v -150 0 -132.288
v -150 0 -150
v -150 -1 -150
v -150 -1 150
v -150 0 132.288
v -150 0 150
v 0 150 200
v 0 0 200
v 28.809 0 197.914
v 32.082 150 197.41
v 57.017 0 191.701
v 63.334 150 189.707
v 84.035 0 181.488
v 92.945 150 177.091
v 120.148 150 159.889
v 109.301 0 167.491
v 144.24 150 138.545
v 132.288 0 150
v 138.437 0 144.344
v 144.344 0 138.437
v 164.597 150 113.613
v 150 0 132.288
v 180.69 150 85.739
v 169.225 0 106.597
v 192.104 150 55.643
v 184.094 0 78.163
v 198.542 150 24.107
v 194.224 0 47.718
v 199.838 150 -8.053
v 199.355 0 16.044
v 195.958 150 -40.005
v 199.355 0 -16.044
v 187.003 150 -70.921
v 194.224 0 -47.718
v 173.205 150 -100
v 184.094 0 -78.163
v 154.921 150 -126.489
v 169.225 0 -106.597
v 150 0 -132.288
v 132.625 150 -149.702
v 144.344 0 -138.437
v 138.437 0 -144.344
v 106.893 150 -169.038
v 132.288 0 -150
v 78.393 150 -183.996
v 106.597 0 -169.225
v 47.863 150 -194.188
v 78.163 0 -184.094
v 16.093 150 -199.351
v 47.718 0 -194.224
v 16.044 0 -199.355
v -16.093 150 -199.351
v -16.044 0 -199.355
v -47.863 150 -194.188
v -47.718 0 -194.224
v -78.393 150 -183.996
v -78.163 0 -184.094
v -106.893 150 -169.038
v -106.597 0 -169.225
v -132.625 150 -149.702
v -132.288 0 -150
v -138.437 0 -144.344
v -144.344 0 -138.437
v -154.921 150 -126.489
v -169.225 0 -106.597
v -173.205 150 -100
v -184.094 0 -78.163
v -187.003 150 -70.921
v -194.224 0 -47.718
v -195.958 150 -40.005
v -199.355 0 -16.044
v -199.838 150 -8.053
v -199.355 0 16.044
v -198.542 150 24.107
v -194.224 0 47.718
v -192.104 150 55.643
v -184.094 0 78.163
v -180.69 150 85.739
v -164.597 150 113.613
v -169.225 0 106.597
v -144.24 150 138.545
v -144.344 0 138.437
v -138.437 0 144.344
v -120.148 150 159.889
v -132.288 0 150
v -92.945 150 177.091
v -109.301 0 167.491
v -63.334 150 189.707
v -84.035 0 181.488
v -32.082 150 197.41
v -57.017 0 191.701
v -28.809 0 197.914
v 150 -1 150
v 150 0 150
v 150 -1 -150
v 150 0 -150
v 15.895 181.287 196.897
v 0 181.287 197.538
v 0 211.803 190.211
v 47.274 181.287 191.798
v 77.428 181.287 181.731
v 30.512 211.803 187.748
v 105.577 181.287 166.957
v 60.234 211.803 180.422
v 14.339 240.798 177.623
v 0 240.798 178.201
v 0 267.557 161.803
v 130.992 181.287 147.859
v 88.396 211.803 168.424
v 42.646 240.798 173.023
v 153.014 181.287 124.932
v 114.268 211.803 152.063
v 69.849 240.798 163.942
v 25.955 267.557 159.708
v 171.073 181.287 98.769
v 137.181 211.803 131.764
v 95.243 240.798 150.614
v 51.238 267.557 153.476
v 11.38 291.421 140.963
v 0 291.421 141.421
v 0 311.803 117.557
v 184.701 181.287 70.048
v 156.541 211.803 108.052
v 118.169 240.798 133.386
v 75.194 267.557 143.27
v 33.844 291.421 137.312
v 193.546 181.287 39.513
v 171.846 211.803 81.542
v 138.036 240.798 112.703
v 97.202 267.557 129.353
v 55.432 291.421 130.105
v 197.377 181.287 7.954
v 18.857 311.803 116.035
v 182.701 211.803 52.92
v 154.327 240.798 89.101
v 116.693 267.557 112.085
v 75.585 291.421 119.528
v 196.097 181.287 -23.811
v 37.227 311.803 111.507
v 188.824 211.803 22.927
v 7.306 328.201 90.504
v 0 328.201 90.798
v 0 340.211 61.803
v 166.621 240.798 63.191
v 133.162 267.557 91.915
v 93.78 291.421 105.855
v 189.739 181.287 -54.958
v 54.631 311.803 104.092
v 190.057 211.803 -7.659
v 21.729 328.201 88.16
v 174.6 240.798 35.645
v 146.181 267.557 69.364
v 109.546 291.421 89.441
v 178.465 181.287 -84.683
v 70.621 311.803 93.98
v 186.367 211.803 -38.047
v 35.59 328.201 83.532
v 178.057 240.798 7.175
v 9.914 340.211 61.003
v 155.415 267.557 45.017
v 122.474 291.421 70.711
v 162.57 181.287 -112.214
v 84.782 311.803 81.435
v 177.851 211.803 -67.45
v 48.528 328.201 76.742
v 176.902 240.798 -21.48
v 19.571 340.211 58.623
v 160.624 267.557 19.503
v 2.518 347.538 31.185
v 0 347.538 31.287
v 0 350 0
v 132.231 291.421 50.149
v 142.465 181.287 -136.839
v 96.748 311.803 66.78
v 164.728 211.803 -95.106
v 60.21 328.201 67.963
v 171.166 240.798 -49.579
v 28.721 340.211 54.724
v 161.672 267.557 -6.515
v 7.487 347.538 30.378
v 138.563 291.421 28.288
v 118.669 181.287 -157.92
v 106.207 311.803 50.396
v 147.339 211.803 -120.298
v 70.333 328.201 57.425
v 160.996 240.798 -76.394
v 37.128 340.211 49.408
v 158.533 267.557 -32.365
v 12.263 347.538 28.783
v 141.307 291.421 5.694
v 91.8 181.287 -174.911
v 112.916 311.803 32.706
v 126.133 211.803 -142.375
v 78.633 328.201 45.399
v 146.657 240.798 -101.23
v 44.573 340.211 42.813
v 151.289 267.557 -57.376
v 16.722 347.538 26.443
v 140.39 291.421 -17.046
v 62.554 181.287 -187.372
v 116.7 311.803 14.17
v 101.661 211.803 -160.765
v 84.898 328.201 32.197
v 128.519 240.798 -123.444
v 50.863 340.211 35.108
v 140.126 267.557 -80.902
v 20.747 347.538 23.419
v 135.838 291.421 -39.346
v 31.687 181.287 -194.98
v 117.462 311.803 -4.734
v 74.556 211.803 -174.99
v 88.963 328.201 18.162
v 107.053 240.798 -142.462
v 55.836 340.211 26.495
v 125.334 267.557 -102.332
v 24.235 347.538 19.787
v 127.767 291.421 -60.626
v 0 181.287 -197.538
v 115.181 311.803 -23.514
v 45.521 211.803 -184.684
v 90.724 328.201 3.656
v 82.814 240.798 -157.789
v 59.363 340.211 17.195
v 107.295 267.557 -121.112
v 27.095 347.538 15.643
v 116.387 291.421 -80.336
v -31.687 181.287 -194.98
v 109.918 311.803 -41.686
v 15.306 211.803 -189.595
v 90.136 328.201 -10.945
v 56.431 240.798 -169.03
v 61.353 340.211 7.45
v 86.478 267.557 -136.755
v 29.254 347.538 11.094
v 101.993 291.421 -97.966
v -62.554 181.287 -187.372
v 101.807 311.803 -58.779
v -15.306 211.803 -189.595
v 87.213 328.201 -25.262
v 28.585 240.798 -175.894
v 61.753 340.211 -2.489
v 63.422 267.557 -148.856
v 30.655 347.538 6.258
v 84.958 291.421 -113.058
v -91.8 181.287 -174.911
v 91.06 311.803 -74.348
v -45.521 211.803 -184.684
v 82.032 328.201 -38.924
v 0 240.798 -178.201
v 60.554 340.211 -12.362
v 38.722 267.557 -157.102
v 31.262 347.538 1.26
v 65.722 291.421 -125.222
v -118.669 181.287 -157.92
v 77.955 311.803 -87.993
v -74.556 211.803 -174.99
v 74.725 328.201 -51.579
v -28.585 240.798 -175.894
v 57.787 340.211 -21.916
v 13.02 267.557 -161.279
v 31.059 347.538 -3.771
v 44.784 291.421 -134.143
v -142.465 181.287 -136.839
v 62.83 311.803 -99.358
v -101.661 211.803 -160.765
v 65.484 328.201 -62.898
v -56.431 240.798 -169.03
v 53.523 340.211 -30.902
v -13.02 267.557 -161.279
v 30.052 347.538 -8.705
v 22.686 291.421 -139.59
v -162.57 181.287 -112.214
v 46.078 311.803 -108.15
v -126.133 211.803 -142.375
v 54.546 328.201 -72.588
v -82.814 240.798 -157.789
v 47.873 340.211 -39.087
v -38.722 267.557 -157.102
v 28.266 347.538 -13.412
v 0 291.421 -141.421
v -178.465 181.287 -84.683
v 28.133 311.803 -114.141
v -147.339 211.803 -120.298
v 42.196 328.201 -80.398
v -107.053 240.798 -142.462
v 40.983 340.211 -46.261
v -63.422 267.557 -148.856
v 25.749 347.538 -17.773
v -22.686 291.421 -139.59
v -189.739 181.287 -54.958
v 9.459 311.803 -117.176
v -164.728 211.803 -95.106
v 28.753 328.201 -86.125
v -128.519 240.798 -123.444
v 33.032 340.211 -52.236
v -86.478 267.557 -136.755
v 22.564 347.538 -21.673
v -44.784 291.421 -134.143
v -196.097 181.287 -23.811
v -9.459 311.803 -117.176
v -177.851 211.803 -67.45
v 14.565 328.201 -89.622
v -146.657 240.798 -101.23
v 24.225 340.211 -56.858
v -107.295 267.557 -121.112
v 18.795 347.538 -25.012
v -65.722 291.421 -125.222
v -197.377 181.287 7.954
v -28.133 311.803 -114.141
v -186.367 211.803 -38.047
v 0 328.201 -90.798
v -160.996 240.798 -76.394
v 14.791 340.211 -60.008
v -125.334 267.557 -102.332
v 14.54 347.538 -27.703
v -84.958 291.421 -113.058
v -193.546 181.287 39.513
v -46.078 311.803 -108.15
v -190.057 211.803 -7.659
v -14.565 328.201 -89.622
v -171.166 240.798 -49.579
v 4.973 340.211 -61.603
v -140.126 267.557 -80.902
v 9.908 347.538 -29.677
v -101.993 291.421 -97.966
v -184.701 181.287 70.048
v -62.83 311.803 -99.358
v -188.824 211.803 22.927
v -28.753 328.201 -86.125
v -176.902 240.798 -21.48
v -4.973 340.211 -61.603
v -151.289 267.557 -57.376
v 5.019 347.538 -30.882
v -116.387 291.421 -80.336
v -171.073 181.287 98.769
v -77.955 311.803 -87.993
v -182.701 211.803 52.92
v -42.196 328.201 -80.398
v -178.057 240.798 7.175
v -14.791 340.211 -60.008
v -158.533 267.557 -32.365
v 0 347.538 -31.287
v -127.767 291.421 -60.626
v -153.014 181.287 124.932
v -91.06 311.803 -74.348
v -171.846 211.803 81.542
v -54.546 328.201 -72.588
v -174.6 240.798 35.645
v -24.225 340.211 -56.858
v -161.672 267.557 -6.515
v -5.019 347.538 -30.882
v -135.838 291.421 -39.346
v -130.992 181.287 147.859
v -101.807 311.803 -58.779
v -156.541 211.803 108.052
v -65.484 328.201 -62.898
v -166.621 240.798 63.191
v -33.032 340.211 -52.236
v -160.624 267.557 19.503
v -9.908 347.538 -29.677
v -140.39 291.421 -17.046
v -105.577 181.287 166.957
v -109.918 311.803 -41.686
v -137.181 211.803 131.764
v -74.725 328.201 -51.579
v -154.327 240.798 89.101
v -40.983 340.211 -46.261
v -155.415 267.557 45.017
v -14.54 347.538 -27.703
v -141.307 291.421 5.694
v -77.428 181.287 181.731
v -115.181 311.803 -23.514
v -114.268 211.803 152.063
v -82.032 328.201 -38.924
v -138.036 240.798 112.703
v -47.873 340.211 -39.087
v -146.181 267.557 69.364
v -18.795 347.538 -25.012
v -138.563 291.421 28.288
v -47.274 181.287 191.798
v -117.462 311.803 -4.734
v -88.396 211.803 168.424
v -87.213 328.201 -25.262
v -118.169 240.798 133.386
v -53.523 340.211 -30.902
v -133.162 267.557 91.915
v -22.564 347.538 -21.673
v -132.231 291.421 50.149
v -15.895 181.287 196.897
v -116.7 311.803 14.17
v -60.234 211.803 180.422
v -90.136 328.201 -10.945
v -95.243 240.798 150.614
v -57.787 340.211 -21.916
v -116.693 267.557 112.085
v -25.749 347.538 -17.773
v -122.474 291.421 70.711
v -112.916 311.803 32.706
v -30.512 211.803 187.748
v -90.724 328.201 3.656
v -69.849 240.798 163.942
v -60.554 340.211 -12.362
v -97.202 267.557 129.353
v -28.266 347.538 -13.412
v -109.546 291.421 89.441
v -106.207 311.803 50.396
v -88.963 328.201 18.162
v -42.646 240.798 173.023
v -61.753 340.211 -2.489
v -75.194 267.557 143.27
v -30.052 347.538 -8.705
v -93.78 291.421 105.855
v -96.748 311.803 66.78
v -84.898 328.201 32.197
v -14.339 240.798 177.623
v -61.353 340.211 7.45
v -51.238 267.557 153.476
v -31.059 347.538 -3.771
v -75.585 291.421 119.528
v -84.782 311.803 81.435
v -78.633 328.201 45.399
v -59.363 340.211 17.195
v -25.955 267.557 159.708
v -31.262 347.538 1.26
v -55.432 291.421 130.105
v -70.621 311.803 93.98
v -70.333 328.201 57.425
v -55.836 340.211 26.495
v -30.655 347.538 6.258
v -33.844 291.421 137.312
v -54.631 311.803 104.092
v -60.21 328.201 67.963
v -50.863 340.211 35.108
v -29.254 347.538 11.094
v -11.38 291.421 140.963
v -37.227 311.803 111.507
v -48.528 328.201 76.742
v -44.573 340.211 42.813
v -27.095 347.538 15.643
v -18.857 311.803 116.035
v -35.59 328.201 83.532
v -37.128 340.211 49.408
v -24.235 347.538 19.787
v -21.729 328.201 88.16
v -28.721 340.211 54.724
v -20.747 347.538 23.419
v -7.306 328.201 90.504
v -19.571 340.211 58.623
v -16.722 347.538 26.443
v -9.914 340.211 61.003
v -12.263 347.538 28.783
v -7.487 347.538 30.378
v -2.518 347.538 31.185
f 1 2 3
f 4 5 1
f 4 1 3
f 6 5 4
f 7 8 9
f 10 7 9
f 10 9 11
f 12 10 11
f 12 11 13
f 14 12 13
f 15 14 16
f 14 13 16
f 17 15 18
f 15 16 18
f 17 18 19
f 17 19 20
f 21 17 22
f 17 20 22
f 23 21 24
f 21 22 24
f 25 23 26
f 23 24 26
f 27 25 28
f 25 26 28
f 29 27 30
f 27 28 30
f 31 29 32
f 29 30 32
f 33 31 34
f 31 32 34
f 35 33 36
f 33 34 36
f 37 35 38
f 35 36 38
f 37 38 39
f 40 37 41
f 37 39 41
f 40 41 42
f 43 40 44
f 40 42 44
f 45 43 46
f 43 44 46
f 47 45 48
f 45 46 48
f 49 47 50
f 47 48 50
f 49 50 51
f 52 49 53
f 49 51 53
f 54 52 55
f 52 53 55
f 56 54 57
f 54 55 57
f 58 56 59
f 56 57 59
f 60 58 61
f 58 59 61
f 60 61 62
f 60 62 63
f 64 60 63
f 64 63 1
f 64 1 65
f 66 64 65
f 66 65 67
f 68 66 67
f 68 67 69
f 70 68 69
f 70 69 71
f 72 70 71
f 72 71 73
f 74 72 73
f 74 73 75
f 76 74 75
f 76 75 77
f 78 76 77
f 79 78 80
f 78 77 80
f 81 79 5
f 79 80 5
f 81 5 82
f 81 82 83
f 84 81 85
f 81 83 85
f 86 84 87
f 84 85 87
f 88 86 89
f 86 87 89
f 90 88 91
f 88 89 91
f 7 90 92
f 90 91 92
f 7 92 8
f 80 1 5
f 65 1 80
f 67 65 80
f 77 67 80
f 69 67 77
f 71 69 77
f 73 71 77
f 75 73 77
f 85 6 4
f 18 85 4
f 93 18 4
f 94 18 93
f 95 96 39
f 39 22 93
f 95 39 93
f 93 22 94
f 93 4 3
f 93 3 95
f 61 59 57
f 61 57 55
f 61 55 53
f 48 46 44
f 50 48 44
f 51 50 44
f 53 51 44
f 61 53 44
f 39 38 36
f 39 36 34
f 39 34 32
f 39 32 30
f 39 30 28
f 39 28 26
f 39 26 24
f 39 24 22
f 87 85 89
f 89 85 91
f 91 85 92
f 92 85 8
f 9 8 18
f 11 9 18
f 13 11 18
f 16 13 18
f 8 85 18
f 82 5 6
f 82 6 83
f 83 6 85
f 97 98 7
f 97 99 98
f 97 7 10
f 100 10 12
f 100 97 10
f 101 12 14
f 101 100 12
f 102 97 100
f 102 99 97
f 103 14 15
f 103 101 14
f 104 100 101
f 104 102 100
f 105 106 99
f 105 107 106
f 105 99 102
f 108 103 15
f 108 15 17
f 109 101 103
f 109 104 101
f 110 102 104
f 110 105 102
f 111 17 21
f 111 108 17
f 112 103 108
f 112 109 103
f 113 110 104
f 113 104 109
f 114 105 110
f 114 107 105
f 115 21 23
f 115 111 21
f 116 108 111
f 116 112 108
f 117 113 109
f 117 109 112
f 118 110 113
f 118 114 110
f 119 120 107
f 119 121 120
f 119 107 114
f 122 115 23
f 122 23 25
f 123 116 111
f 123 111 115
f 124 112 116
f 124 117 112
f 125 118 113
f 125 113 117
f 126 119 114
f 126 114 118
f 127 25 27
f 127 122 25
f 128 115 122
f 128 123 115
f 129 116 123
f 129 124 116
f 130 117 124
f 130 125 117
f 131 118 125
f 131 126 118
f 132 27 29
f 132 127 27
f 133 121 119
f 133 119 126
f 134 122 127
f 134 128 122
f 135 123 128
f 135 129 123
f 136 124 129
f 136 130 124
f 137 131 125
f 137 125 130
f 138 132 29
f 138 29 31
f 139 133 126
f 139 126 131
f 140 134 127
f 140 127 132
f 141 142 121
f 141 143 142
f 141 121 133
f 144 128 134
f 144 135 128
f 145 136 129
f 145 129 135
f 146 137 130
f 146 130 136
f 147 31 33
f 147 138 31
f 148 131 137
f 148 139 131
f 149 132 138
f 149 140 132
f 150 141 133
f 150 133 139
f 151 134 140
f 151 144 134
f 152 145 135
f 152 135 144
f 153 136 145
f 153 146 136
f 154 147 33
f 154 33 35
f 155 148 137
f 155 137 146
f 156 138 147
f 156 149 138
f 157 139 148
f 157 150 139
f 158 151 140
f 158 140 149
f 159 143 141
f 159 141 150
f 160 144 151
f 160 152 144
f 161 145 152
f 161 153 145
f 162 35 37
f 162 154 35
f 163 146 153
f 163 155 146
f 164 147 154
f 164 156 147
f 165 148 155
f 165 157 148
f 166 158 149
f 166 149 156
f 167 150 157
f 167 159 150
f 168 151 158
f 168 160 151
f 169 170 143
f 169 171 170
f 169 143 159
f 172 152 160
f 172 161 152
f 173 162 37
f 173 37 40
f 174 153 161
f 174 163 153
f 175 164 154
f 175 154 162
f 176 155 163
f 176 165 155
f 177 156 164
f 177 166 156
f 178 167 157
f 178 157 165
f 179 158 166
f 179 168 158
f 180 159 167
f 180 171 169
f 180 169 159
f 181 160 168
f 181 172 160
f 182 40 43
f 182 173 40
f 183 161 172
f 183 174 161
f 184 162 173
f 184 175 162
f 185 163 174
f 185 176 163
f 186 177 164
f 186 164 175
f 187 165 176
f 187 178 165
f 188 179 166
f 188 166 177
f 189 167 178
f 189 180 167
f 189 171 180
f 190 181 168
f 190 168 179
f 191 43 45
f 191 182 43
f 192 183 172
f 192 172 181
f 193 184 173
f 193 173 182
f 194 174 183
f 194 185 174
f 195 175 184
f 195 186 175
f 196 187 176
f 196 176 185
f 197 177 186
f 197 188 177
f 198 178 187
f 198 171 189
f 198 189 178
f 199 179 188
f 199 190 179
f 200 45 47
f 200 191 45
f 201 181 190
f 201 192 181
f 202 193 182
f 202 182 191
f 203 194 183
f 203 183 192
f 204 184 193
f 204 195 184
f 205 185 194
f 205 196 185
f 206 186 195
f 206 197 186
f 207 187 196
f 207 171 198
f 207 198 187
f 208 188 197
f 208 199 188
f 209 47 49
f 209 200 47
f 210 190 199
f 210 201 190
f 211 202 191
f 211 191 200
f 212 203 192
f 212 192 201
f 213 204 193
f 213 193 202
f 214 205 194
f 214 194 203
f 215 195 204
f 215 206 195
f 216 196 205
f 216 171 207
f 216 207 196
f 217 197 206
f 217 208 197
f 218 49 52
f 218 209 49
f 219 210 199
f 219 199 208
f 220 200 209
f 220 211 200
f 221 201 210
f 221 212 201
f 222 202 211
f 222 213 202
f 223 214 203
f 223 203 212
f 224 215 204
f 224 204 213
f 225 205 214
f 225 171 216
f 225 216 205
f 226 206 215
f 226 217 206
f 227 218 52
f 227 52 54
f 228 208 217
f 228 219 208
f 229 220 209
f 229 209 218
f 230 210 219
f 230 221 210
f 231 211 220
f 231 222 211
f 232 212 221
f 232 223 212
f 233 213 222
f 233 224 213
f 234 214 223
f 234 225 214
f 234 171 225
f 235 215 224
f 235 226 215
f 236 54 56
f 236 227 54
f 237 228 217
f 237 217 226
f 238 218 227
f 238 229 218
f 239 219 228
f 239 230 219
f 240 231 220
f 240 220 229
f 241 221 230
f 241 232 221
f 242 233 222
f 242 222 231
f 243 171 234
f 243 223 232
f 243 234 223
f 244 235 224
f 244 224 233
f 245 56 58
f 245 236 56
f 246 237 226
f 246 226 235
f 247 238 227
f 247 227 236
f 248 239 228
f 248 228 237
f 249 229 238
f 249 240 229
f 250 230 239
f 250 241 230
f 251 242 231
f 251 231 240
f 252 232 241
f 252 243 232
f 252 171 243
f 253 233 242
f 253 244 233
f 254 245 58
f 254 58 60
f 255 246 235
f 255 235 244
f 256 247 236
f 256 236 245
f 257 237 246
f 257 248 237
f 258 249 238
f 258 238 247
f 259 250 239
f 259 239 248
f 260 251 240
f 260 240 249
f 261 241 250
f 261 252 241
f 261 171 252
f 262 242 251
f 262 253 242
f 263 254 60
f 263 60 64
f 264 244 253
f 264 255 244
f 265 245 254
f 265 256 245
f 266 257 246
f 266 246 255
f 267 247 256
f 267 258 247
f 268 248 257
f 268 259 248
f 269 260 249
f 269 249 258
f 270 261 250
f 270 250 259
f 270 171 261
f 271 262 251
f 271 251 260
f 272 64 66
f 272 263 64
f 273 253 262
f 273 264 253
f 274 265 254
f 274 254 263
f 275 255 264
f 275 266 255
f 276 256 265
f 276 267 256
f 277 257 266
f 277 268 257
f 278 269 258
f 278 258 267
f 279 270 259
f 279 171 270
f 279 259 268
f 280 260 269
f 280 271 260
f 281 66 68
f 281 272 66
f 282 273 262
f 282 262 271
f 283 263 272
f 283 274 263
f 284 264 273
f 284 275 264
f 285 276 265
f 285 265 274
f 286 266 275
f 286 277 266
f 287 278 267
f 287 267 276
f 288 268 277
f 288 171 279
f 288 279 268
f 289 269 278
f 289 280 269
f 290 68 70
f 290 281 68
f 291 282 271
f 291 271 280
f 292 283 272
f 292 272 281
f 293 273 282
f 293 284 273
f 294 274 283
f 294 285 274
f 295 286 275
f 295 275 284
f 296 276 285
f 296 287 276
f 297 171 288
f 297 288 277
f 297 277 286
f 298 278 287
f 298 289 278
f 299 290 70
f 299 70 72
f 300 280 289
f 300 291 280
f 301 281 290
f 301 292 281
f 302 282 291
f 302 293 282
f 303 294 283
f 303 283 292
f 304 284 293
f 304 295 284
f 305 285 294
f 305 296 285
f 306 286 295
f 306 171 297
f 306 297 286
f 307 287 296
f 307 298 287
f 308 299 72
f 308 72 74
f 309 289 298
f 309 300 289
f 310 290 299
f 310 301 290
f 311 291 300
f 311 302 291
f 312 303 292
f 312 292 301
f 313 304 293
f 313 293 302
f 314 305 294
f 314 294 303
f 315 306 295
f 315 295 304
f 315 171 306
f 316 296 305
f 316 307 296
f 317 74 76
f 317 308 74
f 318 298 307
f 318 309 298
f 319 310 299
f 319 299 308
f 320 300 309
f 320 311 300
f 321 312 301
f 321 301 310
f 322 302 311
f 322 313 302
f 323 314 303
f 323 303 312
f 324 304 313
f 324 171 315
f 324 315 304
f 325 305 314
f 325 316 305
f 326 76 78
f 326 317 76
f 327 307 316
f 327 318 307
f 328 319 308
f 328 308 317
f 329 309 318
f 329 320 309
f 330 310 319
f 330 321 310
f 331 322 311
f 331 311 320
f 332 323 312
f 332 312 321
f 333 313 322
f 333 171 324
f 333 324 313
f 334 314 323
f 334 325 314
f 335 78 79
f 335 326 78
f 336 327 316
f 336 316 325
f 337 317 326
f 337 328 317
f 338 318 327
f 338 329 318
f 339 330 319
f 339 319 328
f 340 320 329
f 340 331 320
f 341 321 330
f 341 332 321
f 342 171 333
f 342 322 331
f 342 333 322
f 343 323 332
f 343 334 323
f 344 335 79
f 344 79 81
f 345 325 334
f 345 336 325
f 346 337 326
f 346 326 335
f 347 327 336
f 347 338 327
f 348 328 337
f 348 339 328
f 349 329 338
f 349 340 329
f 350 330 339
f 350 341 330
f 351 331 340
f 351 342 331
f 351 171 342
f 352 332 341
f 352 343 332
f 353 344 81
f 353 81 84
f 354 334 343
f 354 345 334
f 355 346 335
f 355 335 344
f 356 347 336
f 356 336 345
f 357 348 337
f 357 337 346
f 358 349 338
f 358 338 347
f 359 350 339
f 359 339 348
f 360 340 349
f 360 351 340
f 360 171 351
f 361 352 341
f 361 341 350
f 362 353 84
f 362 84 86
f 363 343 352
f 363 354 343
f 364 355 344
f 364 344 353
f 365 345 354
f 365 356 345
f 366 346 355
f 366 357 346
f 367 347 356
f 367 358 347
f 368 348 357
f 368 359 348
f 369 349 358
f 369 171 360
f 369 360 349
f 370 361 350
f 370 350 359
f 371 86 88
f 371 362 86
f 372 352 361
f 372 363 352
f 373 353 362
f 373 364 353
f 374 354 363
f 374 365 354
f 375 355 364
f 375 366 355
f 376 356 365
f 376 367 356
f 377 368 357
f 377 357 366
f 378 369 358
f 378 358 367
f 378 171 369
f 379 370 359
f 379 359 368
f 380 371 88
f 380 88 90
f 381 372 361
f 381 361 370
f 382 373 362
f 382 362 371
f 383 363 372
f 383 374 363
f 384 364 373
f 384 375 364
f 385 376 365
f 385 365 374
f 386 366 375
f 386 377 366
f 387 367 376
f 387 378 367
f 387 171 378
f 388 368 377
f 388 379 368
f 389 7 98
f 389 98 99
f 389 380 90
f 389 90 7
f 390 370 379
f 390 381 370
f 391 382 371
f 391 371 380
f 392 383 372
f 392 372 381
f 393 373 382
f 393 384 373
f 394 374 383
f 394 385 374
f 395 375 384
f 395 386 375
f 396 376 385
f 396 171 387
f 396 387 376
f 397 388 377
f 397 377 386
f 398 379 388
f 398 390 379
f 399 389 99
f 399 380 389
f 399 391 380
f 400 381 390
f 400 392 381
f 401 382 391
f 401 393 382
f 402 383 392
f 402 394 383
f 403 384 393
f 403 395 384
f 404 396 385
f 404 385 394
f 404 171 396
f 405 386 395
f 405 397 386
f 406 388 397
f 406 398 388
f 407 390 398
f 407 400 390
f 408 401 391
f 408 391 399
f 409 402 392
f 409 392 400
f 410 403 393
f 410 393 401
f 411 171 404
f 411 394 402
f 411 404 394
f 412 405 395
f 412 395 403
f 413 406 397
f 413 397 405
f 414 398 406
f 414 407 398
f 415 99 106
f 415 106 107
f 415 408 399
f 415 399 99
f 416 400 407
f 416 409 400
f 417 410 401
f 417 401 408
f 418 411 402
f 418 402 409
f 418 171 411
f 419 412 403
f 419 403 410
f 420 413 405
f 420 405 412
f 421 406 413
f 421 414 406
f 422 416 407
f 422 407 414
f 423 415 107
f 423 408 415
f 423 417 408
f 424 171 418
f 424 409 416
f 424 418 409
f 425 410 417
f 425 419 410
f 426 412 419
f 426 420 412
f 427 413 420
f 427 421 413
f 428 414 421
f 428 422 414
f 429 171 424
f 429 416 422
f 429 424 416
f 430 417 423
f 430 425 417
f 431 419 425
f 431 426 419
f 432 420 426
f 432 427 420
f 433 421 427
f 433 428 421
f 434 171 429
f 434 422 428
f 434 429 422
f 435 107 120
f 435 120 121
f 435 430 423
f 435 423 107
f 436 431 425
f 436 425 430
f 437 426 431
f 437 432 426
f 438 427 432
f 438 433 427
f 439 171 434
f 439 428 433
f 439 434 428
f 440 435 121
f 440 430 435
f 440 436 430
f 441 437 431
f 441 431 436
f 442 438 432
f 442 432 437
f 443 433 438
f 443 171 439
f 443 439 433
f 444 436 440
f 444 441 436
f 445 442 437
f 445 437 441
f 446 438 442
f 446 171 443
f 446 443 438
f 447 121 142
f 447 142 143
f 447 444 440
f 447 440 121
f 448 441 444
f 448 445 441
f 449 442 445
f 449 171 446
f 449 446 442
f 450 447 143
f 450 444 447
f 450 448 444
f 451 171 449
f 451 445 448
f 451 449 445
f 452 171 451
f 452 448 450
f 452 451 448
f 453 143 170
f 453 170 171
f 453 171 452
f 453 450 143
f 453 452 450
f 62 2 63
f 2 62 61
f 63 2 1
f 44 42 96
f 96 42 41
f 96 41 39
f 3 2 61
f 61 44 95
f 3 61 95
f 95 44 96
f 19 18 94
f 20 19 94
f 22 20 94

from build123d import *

# Parameters (mm, degrees)
SKETCH2_R           = 200
BOSS_EXTRUDE1_DEPTH = 150
DOME2_FACE_RADIUS   = 200
DOME2_HEIGHT        = 200
SKETCH4_W           = 300
SKETCH4_H           = 300
BOSS_EXTRUDE2_DEPTH = 1


with BuildPart() as part:
    # Sketch2 → Boss-Extrude1 (new body)
    with BuildSketch(Plane(origin=(0, 0, 0), x_dir=(1, 0, 0), z_dir=(0, 1, 0))):
        with Locations(Location((0, 0, 0), (0, 0, 270))):
            Circle(SKETCH2_R)
    extrude(amount=BOSS_EXTRUDE1_DEPTH)

    # Dome2: a dome of height H over a round flat face of radius A is a cap of a sphere of radius (A * A + H * H) / (2 * H)
    dome2_r = (DOME2_FACE_RADIUS * DOME2_FACE_RADIUS + DOME2_HEIGHT * DOME2_HEIGHT) / (2 * DOME2_HEIGHT)
    dome2_base = Plane((0, 150, 0), z_dir=(0, 1, 0))
    with Locations(dome2_base.offset(DOME2_HEIGHT - dome2_r)):
        dome2_ball = Sphere(dome2_r, mode=Mode.PRIVATE)
    add(split(dome2_ball, bisect_by=dome2_base, keep=Keep.TOP, mode=Mode.PRIVATE))

    # Sketch4 → Boss-Extrude2 (add)
    with BuildSketch(Plane.XZ):
        Rectangle(SKETCH4_W, SKETCH4_H)
    extrude(amount=BOSS_EXTRUDE2_DEPTH)


solid = part.part
